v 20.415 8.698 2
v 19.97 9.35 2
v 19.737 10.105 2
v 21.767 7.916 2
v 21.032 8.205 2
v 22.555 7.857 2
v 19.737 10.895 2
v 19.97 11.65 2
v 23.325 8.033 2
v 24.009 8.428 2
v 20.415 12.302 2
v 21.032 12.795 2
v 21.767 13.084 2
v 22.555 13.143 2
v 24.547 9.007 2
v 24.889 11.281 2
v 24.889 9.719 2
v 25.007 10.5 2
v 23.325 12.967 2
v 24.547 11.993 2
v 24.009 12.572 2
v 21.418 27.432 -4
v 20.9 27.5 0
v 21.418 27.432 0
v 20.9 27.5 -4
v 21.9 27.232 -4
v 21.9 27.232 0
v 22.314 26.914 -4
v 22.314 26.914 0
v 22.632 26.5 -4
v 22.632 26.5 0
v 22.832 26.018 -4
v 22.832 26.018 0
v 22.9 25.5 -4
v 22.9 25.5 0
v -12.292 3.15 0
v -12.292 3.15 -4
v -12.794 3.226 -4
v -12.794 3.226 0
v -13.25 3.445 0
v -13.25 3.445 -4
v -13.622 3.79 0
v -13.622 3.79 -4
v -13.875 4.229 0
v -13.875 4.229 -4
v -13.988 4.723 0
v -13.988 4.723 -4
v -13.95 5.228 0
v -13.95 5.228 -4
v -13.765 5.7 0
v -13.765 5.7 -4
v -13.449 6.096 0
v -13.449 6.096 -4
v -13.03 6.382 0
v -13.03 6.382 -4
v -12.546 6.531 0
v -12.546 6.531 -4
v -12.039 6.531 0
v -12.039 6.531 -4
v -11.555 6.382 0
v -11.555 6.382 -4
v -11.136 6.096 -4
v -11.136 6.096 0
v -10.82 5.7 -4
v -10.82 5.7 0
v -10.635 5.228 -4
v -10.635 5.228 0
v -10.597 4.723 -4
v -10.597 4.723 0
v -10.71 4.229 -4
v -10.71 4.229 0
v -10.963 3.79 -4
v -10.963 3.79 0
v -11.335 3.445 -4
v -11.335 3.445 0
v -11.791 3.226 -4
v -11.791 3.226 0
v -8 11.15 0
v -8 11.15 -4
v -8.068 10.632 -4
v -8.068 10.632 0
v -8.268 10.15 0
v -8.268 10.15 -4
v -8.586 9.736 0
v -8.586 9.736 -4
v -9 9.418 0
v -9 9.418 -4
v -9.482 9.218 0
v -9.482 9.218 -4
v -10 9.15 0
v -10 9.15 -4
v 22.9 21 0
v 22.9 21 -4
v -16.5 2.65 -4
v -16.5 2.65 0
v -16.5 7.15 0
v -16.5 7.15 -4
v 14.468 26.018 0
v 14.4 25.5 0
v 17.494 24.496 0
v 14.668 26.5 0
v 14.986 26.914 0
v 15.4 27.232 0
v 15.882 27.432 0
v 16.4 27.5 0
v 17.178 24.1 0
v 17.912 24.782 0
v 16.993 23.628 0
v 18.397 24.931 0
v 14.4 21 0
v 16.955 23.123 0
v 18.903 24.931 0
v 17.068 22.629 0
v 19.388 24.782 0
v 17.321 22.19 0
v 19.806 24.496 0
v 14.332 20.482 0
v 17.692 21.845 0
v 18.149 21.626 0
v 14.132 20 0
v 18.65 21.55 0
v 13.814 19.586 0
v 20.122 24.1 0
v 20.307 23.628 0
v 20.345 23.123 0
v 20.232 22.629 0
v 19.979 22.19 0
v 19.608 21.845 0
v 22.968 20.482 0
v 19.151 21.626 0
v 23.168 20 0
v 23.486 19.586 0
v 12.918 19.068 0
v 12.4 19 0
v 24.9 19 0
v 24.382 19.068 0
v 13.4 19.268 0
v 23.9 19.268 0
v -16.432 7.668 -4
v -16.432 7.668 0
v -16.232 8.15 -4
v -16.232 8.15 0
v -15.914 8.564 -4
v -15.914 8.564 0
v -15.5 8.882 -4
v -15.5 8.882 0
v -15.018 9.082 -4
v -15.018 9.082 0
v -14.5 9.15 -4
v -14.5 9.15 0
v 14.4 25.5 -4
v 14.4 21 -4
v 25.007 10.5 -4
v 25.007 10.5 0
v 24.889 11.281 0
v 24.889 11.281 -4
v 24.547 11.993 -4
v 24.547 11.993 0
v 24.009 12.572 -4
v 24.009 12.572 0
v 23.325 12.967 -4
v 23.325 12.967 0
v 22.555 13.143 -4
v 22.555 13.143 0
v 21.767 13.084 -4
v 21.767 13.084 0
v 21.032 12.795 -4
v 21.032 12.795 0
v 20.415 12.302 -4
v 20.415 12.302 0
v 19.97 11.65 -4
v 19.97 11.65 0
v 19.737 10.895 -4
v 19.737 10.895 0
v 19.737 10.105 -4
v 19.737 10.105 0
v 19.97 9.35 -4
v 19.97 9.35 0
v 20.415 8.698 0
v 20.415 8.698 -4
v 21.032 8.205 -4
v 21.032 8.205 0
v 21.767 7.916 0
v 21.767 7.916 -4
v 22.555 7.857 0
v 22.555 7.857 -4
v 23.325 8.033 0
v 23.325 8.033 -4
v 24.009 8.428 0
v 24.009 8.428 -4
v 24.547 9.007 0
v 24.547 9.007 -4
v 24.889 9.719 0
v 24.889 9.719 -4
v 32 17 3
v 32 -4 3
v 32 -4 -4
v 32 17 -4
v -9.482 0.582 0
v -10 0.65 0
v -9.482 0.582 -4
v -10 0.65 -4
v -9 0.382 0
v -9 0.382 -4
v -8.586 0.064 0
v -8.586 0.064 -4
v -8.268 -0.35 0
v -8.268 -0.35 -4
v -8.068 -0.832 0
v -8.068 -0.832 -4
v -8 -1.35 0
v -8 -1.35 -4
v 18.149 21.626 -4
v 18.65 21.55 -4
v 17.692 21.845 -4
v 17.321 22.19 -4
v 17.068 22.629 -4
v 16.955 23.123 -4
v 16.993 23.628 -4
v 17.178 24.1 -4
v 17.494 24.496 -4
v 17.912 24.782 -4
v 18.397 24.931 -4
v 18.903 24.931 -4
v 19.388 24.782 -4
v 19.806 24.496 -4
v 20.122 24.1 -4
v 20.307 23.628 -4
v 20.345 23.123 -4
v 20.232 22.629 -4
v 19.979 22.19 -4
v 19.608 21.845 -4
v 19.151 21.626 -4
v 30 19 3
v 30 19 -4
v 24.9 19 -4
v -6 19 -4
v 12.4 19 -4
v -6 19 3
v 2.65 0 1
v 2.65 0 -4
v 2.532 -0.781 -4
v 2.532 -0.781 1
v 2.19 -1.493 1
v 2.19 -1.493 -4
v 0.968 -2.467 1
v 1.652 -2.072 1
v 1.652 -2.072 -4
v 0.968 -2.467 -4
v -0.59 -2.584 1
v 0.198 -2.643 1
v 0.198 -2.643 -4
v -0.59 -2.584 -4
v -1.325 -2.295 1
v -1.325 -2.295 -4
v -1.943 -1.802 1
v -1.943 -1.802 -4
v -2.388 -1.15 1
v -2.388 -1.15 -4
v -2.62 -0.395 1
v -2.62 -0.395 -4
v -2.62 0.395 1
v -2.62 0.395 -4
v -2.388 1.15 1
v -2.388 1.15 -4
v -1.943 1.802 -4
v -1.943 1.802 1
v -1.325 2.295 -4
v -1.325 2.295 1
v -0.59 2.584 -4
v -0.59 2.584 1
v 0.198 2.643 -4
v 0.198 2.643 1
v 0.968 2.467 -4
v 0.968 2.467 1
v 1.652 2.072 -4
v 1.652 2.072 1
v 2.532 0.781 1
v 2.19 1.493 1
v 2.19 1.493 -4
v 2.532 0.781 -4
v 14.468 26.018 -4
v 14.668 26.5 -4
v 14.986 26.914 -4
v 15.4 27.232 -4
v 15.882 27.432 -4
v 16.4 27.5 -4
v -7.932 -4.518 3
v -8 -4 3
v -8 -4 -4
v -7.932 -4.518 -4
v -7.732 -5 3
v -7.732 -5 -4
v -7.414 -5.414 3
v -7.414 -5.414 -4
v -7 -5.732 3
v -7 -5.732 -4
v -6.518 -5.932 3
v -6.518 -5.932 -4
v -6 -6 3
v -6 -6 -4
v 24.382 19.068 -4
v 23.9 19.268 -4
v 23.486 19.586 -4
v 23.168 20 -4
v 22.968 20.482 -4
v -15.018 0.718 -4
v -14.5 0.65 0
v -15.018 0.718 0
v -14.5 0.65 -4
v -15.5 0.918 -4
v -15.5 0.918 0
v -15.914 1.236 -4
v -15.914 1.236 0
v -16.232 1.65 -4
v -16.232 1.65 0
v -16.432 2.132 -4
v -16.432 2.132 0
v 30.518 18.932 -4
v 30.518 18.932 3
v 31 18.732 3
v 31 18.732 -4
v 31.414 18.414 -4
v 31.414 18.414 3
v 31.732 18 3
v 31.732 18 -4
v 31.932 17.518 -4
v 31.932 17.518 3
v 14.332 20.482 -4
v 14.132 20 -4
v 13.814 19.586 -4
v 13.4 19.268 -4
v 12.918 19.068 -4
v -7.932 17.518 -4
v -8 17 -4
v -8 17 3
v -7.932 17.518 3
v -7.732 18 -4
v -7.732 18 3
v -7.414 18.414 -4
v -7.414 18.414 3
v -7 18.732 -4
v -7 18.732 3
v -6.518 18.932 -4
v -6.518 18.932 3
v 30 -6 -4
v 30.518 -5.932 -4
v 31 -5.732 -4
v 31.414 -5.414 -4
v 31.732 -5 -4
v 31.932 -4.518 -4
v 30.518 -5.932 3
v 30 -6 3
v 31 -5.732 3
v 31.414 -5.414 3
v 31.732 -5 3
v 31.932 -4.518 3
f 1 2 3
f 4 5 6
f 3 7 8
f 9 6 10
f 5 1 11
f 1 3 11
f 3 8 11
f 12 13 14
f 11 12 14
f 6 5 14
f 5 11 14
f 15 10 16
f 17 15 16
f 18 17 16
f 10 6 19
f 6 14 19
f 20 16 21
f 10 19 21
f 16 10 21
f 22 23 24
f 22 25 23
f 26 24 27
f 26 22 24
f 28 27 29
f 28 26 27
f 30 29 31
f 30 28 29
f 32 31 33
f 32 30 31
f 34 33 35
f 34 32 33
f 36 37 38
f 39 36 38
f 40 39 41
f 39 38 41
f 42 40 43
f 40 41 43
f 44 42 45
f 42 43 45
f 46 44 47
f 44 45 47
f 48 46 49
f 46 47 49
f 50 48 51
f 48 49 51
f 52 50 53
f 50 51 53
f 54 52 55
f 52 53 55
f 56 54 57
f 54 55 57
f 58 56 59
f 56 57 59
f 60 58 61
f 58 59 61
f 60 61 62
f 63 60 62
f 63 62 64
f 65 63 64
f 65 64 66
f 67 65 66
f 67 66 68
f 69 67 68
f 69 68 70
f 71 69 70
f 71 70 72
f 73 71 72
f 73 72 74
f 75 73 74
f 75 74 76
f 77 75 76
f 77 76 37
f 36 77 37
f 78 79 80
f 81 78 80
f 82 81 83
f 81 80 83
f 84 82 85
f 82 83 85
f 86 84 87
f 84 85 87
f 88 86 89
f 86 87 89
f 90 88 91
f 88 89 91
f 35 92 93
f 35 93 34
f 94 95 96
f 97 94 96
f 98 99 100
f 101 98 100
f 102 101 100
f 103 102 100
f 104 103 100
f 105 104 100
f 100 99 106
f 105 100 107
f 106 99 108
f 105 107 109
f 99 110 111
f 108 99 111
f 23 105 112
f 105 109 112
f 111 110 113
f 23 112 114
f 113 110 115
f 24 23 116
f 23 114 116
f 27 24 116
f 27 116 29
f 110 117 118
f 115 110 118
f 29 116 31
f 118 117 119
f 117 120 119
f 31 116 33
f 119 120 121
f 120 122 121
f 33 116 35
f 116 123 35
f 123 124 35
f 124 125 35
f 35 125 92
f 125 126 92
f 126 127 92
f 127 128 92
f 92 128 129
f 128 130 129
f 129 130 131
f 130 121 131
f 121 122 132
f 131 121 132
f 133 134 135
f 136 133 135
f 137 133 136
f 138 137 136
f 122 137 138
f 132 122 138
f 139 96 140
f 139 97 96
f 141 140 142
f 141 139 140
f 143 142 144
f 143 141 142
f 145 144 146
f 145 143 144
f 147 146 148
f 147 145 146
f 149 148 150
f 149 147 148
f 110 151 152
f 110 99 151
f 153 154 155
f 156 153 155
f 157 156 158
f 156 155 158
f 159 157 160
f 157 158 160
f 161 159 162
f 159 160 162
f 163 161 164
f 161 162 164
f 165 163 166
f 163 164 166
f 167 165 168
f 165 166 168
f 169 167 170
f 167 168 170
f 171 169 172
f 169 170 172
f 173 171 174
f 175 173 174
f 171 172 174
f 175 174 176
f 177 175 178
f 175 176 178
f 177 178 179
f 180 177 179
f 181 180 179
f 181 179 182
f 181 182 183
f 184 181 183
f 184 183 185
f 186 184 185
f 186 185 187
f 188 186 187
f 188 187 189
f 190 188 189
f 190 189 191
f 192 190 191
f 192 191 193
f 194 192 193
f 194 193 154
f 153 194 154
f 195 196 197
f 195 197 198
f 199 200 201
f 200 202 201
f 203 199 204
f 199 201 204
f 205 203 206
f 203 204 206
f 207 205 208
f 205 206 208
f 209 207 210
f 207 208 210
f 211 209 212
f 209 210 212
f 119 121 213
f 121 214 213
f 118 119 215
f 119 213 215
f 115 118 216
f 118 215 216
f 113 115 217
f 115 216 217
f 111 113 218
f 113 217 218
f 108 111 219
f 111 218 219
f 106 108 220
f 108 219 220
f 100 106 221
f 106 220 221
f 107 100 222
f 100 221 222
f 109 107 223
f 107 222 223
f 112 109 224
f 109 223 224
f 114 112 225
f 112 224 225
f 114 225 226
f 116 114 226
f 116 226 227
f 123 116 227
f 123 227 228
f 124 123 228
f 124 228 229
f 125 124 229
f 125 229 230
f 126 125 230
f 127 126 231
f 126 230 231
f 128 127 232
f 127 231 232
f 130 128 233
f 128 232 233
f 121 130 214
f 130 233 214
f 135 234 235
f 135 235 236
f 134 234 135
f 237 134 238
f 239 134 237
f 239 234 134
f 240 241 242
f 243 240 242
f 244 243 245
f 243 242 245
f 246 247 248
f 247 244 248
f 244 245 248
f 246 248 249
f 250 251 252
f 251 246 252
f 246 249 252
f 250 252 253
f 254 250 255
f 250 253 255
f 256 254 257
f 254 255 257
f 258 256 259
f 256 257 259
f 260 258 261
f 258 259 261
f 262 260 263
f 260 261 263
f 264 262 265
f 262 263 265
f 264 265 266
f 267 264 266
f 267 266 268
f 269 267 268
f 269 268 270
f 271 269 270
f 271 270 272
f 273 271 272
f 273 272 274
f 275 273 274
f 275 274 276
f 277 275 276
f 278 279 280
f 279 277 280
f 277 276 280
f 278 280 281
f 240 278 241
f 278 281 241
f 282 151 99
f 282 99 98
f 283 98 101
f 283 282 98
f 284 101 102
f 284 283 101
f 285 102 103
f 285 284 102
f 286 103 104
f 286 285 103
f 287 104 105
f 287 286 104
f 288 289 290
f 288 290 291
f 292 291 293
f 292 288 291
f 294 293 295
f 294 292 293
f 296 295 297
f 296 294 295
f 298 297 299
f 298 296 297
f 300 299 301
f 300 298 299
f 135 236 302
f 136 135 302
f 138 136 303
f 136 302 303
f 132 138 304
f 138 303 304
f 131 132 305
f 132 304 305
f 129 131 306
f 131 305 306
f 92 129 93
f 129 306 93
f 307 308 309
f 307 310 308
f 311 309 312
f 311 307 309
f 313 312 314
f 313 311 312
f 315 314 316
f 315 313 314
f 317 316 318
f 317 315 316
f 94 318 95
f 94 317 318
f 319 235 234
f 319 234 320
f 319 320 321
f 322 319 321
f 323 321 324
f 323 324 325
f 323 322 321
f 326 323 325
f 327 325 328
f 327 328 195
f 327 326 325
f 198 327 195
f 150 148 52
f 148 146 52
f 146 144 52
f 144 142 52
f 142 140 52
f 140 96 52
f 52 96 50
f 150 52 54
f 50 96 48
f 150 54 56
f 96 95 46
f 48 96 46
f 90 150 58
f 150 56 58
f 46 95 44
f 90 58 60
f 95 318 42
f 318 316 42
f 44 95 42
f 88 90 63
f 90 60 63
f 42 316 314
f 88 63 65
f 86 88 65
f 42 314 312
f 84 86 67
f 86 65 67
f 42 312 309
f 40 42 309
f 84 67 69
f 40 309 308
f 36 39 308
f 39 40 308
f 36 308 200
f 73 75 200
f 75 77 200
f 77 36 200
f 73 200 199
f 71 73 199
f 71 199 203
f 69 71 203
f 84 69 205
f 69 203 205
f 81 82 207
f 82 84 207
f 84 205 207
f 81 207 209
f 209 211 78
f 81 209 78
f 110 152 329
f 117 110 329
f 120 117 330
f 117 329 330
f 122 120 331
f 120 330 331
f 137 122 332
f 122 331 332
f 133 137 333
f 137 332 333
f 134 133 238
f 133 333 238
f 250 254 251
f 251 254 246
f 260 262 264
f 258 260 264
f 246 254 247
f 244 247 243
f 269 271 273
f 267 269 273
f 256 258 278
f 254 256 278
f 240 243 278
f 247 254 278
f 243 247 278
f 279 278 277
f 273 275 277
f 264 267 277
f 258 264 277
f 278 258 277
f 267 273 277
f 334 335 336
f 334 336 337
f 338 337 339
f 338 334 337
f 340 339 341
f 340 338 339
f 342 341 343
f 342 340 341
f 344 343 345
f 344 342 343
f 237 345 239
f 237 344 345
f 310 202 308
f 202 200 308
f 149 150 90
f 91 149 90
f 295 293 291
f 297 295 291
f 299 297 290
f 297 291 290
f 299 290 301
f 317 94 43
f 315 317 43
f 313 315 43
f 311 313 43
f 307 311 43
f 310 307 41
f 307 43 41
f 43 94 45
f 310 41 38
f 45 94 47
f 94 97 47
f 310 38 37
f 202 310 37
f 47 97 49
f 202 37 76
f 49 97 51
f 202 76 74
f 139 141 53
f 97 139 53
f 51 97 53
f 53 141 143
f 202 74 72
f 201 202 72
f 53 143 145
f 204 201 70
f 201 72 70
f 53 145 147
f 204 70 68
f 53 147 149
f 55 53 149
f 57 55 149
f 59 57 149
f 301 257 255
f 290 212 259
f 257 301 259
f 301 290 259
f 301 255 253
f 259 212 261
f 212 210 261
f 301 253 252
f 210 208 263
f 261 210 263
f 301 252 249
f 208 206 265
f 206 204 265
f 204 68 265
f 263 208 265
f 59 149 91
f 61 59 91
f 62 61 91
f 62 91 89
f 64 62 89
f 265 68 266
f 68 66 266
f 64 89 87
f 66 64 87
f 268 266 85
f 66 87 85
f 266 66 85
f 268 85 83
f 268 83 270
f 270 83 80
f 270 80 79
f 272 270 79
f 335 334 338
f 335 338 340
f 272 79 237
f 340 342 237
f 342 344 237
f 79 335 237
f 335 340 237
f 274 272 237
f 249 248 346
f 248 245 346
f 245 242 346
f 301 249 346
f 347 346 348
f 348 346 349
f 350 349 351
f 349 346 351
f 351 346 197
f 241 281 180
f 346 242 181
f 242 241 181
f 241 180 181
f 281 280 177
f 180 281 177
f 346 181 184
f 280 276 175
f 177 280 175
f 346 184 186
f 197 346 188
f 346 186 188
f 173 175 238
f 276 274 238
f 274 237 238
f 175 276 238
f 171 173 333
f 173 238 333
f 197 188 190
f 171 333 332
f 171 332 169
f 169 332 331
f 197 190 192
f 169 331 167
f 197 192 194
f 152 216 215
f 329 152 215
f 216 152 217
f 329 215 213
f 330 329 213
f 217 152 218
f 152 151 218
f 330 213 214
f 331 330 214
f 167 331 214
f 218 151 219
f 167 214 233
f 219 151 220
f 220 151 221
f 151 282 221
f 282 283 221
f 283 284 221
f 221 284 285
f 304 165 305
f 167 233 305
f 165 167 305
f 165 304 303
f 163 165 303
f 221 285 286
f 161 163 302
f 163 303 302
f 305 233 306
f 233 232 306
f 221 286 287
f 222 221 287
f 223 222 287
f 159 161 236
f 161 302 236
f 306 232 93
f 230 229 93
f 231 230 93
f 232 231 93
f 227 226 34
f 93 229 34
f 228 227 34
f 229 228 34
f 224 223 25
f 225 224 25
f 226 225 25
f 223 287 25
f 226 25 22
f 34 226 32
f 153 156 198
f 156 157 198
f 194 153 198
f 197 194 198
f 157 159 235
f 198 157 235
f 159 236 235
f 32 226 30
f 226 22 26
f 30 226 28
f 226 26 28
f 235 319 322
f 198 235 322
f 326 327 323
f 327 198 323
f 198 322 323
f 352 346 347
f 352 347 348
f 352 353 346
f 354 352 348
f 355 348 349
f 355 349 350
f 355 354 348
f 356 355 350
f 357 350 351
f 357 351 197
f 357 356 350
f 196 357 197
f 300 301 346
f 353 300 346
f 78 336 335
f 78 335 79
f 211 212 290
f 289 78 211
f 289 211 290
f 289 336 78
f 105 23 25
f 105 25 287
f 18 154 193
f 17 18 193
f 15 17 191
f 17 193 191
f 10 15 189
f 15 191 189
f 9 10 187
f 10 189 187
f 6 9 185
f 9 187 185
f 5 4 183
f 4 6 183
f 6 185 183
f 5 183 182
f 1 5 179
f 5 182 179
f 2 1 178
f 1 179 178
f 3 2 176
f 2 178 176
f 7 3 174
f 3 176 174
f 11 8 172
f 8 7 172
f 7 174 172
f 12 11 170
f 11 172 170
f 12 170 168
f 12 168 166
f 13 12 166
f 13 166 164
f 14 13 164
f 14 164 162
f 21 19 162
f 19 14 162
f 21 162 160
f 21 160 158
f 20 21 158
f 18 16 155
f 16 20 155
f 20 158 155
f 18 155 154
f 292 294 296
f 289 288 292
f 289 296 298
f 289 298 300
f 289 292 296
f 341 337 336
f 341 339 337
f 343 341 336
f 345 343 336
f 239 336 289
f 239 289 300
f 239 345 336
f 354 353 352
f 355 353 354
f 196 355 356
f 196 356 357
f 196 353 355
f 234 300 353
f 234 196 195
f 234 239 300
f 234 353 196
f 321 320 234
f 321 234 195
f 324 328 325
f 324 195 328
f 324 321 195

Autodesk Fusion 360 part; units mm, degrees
sketch "Sketch1" plane through (0, 0, 0) normal (0, 0, 1) x (1, 0, 0)
  line L0 (0, 0) -> (0, 10.5)
  line L1 (0, 0) -> (22.3571, 10.5)
  circle A0 centre (0, 0) radius 2 construction
  circle A1 centre (22.3571, 10.5) radius 2 construction
  line L2 (-8, -6) -> (32, -6)
  line L3 (32, -6) -> (32, 19)
  line L4 (32, 19) -> (-8, 19)
  line L5 (-8, 19) -> (-8, -6)
  dimension "d1" = 10.5
  dimension "d2" = 24.7
  dimension "d3" = 4
  dimension "d4" = 4
  dimension "d5" = 25
  dimension "d6" = 40
  dimension "d7" = 8
  dimension "d8" = 6
extrude "Extrude1" add sketch "Sketch1" along normal blind 3 makes body 1
sketch "Sketch2" plane through (0, 0, 0) normal (0, 0, 1) x (1, 0, 0)
  circle A0 centre (0, 0) radius 2.65
  circle A1 centre (22.3571, 10.5) radius 2.65
  point P0 (22.3571, 10.5)
  dimension "d11" = 5.3
  dimension "d12" = 5.3
extrude "Extrude2" cut sketch "Sketch2" along normal blind 2 bodies 1
hole "Hole1" at (-22.3571, -10.5, 2) direction (0, 0, 1) diameter 3.4 depth 4 tip angle 118 bodies 1
sketch "Sketch4" plane through (0, 0, 0) normal (0, 0, -1) x (1, 0, 0)
  circle A0 centre (0, 0) radius 2.65
  line L0 (-8, 6) -> (-8, -19)
  line L1 (-8, -19) -> (32, -19)
  line L2 (32, -19) -> (32, 6)
  line L3 (32, 6) -> (-8, 6)
  line L4 (-12.2925, -4.85) -> (18.65, -23.25) construction
  line L5 (-8, -0.65) -> (-16.5, -0.65)
  line L6 (-16.5, -0.65) -> (-16.5, -9.15)
  line L7 (-16.5, -9.15) -> (-8, -9.15)
  line L8 (-8, -9.15) -> (-8, -0.65)
  line L9 (-16.5, -4.9) -> (-8, -4.9) construction
  line L10 (14.4, -19) -> (22.9, -19) construction
  line L11 (22.9, -19) -> (22.9, -27.5)
  line L12 (22.9, -27.5) -> (14.4, -27.5)
  line L13 (14.4, -27.5) -> (14.4, -19)
  line L14 (18.65, -19) -> (18.65, -27.5) construction
  line L15 (22.9, -23.25) -> (14.4, -23.25) construction
  line L16 (-12.25, -9.15) -> (-12.25, -0.65) construction
  dimension "d26" = 36
  dimension "d27" = 18.4
  dimension "d28" = 8.5
  dimension "d29" = 8.5
  dimension "d30" = 9.85
  dimension "d31" = 8.5
  dimension "d32" = 8.5
  dimension "d42" = 9.1
extrude "Extrude3" add sketch "Sketch4" along normal blind 4 separate body contours L0 L5 L6 L7 L8 | L1 L11 L12 L13 makes body 2 at (-10.8333, 3.4833, 0) makes body 3 at (17.2333, 24.6667, 0)
extrude "Extrude4" add 1 faces at (4.2643, 10.916, 0) along direction (0, 0, -1) up to surface (4 mm away) on bodies 1 bodies 1 2 3
hole "Hole3" at (18.65, 23.25, 0) at (-12.2925, 4.85, 0) direction (0, 0, -1) diameter 3.4 depth 4 tip angle 118 bodies 1
extrude "Extrude7" add 1 faces at (-0.1169, 0.6581, 2) along direction (0, 0, -1) blind 1 on bodies 1 bodies 1
fillet "Fillet1" radius 2 12 edges at (-8, 0.65, -2) (-16.5, 0.65, -2) (-8, 9.15, -2) (-16.5, 9.15, -2) (14.4, 19, -2) (22.9, 19, -2) (22.9, 27.5, -2) (14.4, 27.5, -2) (-8, -6, -0.5) (32, -6, -0.5) (32, 19, -0.5) (-8, 19, -0.5) on bodies 1
